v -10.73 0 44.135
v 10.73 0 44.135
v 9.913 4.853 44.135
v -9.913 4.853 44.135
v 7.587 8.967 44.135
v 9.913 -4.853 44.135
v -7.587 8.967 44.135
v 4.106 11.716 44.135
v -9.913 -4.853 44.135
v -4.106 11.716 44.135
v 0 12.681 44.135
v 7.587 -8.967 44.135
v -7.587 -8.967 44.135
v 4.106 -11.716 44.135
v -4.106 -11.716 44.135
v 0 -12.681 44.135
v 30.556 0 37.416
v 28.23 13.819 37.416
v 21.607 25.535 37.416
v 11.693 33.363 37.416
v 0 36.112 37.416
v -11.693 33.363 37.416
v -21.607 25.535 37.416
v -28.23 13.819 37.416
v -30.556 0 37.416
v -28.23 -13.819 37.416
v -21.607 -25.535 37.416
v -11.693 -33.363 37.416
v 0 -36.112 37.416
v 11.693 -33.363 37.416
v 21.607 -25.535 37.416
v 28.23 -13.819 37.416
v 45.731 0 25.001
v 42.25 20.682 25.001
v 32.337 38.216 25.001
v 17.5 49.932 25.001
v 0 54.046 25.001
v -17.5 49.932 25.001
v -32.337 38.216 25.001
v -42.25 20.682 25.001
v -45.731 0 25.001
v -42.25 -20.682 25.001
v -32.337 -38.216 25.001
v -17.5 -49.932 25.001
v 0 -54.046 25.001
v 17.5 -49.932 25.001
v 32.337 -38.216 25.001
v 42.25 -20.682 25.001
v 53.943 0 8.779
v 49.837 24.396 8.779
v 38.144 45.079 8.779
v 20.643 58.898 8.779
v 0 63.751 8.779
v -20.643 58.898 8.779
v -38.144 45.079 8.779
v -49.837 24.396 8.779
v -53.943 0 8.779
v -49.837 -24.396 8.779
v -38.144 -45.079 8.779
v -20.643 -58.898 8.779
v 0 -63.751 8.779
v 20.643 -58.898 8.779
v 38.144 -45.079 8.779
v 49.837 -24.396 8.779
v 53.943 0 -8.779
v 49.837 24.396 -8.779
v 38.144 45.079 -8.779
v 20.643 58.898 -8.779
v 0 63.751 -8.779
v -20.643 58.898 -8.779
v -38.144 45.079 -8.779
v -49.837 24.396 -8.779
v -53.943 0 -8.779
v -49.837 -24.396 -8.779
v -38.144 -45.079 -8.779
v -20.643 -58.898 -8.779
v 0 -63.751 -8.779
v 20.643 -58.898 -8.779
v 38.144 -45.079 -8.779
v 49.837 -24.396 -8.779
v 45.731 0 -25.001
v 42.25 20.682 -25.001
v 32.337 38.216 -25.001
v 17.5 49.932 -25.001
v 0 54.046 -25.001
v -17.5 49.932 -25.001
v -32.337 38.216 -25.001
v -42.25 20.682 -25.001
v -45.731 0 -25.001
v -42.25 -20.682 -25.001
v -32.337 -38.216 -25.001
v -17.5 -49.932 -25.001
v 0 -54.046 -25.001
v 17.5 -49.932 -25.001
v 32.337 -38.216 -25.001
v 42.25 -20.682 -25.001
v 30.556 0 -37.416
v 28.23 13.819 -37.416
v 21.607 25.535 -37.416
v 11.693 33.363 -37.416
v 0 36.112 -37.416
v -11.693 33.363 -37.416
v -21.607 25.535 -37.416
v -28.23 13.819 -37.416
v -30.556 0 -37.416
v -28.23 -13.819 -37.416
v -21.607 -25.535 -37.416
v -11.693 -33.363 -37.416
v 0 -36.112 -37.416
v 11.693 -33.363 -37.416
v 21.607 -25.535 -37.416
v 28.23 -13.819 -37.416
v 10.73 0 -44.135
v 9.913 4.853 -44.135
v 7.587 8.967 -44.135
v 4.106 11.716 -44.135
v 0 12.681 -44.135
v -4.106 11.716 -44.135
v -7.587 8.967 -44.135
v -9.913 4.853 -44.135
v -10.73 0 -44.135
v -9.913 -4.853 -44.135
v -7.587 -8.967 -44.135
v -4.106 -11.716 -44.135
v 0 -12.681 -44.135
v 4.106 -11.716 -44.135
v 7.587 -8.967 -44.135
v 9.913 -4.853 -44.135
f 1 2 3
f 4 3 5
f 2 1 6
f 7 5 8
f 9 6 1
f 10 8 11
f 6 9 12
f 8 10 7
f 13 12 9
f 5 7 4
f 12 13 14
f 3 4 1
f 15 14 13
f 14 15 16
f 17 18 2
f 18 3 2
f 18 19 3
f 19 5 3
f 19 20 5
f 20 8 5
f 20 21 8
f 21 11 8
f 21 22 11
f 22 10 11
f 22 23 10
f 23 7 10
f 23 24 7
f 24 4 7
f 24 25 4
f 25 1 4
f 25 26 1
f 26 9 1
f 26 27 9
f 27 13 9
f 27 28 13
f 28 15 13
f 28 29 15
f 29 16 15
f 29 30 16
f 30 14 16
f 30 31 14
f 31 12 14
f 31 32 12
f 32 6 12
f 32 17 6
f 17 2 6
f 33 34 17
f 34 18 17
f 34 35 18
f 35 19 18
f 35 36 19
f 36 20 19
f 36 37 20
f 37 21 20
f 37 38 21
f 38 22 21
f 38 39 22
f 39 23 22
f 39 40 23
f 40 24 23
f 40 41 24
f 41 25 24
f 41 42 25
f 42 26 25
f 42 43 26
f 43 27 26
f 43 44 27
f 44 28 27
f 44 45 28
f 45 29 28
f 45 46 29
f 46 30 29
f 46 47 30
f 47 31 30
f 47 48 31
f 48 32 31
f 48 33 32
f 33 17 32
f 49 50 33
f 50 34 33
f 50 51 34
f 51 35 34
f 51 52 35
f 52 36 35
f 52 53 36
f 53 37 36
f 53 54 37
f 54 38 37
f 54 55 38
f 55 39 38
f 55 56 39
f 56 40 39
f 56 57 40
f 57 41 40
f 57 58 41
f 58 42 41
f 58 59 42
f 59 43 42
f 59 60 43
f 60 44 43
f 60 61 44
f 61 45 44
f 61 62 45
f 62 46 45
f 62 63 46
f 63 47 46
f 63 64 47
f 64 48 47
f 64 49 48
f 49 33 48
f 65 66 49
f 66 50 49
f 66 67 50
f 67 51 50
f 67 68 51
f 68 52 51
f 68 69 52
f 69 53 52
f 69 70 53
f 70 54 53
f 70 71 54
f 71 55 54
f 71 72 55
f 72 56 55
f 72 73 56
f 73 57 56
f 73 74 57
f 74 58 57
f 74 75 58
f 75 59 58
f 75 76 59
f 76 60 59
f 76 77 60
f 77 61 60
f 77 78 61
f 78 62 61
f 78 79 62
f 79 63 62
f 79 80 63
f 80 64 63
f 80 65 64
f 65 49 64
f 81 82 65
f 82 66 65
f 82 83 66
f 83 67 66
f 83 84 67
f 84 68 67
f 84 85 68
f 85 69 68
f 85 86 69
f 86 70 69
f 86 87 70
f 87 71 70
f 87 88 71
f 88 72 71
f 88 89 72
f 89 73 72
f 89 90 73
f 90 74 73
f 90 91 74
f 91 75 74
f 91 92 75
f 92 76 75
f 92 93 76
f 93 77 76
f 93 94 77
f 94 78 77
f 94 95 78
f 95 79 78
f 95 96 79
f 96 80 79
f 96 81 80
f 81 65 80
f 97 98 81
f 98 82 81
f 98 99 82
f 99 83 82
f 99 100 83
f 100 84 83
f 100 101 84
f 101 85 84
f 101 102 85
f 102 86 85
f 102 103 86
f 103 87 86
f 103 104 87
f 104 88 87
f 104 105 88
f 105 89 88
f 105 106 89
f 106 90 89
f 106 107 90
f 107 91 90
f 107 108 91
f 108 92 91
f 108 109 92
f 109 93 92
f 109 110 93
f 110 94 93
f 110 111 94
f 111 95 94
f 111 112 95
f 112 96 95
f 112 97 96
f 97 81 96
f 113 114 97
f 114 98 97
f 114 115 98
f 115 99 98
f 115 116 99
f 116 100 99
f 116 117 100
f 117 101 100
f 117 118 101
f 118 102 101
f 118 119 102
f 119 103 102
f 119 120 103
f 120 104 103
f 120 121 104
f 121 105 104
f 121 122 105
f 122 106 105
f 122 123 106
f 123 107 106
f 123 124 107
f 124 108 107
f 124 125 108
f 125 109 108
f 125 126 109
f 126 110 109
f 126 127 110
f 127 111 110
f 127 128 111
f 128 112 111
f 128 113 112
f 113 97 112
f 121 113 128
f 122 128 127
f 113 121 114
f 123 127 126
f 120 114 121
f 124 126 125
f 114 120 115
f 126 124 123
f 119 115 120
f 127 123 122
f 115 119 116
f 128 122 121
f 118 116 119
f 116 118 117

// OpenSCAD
// Generated by SolidPython 1.0.1 on 2020-07-29 00:46:49


scale(v = [11, 13, 9]) {
	sphere(r = 5);
}
/***********************************************
*********      SolidPython code:      **********
************************************************
 
# import packages: SolidPython
from solid import *
from solid.utils import *
from itertools import chain, combinations, permutations


class Resize:

    def __init__(self, scad_file):
        self.scad_file = scad_file
        #self.scad_file = import_scad(scad_file)
        # cone/cylinder param:
        self.r1 = 0
        self.r2 = 0
        self.h = 0
        # rectangular prism param:
        self.w = 0
        self.l = 0
        # ellipse param:
        self.r = 0

    # import OpenScad code (file name corresponds to shape)


    # classify shape + parameters
    def assign(self, param1, param2, param3):
        if self.scad_file == 'cone.scad':
            self.r1 = param1
            self.r2 = param2
            self.h = param3
        elif self.scad_file == 'cylinder.scad':
            self.r1 = param1
            self.r2 = param2
            self.h = param3
        elif self.scad_file == 'rectangularPrism.scad':
            self.h = param1
            self.l = param2
            self.w = param3
        else:
            self.r = param1
            self.h = param2

    # resize parameters
    def iterate(self):
        x = range(3, 20, 2)
        i = 1
        if self.scad_file == 'cone.scad':
            tempList = list(permutations(x, 2))
            for temp in tempList:
                param1 = temp[0]
                param2 = temp[1]
                filepath = 'produced_scad_files/' + 'cone' + str(param1) + '_' + str(param2) + '_' + '.scad'
                scad_render_to_file(cylinder(h=param1, r1=param2, r2=0), filepath)

        elif self.scad_file == 'cylinder.scad':
            tempList = list(permutations(x, 3))
            for temp in tempList:
                param1 = temp[0]
                param2 = temp[1]
                filepath = 'produced_scad_files/' + 'cylinder' + str(param1) + '_' + str(param2) + '_' + '.scad'
                scad_render_to_file(cylinder(h=param1, r1=param2, r2=param2), filepath)

        elif self.scad_file == 'rectangularPrism.scad':
            tempList = list(permutations(x, 3))
            for temp in tempList:
                param1 = temp[0]
                param2 = temp[1]
                param3 = temp[2]
                filepath = 'produced_scad_files/' + 'rectangularPrism' + str(param1) + '_' + str(param2) + '_' + str(
                    param3) + '.scad'
                scad_render_to_file(cube(size=(param1, param2, param3)), filepath)

        elif self.scad_file == 'ellipse.scad':
            tempList = list(permutations(x, 4))
            for temp in tempList:
                param1 = temp[0]
                param2 = temp[1]
                param3 = temp[2]
                param4 = temp[3]
                filepath = 'produced_scad_files/' + 'ellipse' + str(param1) + '_' + str(param2) + '_' + str(param3) + '_' + str(param4) + '.scad'
                scad_render_to_file(scale([param1, param2, param3])(sphere(r=param4)), filepath)

    def render_to_scadfile(self):
        scad_render_to_file(scad, 'example.scad') 
 
************************************************/
